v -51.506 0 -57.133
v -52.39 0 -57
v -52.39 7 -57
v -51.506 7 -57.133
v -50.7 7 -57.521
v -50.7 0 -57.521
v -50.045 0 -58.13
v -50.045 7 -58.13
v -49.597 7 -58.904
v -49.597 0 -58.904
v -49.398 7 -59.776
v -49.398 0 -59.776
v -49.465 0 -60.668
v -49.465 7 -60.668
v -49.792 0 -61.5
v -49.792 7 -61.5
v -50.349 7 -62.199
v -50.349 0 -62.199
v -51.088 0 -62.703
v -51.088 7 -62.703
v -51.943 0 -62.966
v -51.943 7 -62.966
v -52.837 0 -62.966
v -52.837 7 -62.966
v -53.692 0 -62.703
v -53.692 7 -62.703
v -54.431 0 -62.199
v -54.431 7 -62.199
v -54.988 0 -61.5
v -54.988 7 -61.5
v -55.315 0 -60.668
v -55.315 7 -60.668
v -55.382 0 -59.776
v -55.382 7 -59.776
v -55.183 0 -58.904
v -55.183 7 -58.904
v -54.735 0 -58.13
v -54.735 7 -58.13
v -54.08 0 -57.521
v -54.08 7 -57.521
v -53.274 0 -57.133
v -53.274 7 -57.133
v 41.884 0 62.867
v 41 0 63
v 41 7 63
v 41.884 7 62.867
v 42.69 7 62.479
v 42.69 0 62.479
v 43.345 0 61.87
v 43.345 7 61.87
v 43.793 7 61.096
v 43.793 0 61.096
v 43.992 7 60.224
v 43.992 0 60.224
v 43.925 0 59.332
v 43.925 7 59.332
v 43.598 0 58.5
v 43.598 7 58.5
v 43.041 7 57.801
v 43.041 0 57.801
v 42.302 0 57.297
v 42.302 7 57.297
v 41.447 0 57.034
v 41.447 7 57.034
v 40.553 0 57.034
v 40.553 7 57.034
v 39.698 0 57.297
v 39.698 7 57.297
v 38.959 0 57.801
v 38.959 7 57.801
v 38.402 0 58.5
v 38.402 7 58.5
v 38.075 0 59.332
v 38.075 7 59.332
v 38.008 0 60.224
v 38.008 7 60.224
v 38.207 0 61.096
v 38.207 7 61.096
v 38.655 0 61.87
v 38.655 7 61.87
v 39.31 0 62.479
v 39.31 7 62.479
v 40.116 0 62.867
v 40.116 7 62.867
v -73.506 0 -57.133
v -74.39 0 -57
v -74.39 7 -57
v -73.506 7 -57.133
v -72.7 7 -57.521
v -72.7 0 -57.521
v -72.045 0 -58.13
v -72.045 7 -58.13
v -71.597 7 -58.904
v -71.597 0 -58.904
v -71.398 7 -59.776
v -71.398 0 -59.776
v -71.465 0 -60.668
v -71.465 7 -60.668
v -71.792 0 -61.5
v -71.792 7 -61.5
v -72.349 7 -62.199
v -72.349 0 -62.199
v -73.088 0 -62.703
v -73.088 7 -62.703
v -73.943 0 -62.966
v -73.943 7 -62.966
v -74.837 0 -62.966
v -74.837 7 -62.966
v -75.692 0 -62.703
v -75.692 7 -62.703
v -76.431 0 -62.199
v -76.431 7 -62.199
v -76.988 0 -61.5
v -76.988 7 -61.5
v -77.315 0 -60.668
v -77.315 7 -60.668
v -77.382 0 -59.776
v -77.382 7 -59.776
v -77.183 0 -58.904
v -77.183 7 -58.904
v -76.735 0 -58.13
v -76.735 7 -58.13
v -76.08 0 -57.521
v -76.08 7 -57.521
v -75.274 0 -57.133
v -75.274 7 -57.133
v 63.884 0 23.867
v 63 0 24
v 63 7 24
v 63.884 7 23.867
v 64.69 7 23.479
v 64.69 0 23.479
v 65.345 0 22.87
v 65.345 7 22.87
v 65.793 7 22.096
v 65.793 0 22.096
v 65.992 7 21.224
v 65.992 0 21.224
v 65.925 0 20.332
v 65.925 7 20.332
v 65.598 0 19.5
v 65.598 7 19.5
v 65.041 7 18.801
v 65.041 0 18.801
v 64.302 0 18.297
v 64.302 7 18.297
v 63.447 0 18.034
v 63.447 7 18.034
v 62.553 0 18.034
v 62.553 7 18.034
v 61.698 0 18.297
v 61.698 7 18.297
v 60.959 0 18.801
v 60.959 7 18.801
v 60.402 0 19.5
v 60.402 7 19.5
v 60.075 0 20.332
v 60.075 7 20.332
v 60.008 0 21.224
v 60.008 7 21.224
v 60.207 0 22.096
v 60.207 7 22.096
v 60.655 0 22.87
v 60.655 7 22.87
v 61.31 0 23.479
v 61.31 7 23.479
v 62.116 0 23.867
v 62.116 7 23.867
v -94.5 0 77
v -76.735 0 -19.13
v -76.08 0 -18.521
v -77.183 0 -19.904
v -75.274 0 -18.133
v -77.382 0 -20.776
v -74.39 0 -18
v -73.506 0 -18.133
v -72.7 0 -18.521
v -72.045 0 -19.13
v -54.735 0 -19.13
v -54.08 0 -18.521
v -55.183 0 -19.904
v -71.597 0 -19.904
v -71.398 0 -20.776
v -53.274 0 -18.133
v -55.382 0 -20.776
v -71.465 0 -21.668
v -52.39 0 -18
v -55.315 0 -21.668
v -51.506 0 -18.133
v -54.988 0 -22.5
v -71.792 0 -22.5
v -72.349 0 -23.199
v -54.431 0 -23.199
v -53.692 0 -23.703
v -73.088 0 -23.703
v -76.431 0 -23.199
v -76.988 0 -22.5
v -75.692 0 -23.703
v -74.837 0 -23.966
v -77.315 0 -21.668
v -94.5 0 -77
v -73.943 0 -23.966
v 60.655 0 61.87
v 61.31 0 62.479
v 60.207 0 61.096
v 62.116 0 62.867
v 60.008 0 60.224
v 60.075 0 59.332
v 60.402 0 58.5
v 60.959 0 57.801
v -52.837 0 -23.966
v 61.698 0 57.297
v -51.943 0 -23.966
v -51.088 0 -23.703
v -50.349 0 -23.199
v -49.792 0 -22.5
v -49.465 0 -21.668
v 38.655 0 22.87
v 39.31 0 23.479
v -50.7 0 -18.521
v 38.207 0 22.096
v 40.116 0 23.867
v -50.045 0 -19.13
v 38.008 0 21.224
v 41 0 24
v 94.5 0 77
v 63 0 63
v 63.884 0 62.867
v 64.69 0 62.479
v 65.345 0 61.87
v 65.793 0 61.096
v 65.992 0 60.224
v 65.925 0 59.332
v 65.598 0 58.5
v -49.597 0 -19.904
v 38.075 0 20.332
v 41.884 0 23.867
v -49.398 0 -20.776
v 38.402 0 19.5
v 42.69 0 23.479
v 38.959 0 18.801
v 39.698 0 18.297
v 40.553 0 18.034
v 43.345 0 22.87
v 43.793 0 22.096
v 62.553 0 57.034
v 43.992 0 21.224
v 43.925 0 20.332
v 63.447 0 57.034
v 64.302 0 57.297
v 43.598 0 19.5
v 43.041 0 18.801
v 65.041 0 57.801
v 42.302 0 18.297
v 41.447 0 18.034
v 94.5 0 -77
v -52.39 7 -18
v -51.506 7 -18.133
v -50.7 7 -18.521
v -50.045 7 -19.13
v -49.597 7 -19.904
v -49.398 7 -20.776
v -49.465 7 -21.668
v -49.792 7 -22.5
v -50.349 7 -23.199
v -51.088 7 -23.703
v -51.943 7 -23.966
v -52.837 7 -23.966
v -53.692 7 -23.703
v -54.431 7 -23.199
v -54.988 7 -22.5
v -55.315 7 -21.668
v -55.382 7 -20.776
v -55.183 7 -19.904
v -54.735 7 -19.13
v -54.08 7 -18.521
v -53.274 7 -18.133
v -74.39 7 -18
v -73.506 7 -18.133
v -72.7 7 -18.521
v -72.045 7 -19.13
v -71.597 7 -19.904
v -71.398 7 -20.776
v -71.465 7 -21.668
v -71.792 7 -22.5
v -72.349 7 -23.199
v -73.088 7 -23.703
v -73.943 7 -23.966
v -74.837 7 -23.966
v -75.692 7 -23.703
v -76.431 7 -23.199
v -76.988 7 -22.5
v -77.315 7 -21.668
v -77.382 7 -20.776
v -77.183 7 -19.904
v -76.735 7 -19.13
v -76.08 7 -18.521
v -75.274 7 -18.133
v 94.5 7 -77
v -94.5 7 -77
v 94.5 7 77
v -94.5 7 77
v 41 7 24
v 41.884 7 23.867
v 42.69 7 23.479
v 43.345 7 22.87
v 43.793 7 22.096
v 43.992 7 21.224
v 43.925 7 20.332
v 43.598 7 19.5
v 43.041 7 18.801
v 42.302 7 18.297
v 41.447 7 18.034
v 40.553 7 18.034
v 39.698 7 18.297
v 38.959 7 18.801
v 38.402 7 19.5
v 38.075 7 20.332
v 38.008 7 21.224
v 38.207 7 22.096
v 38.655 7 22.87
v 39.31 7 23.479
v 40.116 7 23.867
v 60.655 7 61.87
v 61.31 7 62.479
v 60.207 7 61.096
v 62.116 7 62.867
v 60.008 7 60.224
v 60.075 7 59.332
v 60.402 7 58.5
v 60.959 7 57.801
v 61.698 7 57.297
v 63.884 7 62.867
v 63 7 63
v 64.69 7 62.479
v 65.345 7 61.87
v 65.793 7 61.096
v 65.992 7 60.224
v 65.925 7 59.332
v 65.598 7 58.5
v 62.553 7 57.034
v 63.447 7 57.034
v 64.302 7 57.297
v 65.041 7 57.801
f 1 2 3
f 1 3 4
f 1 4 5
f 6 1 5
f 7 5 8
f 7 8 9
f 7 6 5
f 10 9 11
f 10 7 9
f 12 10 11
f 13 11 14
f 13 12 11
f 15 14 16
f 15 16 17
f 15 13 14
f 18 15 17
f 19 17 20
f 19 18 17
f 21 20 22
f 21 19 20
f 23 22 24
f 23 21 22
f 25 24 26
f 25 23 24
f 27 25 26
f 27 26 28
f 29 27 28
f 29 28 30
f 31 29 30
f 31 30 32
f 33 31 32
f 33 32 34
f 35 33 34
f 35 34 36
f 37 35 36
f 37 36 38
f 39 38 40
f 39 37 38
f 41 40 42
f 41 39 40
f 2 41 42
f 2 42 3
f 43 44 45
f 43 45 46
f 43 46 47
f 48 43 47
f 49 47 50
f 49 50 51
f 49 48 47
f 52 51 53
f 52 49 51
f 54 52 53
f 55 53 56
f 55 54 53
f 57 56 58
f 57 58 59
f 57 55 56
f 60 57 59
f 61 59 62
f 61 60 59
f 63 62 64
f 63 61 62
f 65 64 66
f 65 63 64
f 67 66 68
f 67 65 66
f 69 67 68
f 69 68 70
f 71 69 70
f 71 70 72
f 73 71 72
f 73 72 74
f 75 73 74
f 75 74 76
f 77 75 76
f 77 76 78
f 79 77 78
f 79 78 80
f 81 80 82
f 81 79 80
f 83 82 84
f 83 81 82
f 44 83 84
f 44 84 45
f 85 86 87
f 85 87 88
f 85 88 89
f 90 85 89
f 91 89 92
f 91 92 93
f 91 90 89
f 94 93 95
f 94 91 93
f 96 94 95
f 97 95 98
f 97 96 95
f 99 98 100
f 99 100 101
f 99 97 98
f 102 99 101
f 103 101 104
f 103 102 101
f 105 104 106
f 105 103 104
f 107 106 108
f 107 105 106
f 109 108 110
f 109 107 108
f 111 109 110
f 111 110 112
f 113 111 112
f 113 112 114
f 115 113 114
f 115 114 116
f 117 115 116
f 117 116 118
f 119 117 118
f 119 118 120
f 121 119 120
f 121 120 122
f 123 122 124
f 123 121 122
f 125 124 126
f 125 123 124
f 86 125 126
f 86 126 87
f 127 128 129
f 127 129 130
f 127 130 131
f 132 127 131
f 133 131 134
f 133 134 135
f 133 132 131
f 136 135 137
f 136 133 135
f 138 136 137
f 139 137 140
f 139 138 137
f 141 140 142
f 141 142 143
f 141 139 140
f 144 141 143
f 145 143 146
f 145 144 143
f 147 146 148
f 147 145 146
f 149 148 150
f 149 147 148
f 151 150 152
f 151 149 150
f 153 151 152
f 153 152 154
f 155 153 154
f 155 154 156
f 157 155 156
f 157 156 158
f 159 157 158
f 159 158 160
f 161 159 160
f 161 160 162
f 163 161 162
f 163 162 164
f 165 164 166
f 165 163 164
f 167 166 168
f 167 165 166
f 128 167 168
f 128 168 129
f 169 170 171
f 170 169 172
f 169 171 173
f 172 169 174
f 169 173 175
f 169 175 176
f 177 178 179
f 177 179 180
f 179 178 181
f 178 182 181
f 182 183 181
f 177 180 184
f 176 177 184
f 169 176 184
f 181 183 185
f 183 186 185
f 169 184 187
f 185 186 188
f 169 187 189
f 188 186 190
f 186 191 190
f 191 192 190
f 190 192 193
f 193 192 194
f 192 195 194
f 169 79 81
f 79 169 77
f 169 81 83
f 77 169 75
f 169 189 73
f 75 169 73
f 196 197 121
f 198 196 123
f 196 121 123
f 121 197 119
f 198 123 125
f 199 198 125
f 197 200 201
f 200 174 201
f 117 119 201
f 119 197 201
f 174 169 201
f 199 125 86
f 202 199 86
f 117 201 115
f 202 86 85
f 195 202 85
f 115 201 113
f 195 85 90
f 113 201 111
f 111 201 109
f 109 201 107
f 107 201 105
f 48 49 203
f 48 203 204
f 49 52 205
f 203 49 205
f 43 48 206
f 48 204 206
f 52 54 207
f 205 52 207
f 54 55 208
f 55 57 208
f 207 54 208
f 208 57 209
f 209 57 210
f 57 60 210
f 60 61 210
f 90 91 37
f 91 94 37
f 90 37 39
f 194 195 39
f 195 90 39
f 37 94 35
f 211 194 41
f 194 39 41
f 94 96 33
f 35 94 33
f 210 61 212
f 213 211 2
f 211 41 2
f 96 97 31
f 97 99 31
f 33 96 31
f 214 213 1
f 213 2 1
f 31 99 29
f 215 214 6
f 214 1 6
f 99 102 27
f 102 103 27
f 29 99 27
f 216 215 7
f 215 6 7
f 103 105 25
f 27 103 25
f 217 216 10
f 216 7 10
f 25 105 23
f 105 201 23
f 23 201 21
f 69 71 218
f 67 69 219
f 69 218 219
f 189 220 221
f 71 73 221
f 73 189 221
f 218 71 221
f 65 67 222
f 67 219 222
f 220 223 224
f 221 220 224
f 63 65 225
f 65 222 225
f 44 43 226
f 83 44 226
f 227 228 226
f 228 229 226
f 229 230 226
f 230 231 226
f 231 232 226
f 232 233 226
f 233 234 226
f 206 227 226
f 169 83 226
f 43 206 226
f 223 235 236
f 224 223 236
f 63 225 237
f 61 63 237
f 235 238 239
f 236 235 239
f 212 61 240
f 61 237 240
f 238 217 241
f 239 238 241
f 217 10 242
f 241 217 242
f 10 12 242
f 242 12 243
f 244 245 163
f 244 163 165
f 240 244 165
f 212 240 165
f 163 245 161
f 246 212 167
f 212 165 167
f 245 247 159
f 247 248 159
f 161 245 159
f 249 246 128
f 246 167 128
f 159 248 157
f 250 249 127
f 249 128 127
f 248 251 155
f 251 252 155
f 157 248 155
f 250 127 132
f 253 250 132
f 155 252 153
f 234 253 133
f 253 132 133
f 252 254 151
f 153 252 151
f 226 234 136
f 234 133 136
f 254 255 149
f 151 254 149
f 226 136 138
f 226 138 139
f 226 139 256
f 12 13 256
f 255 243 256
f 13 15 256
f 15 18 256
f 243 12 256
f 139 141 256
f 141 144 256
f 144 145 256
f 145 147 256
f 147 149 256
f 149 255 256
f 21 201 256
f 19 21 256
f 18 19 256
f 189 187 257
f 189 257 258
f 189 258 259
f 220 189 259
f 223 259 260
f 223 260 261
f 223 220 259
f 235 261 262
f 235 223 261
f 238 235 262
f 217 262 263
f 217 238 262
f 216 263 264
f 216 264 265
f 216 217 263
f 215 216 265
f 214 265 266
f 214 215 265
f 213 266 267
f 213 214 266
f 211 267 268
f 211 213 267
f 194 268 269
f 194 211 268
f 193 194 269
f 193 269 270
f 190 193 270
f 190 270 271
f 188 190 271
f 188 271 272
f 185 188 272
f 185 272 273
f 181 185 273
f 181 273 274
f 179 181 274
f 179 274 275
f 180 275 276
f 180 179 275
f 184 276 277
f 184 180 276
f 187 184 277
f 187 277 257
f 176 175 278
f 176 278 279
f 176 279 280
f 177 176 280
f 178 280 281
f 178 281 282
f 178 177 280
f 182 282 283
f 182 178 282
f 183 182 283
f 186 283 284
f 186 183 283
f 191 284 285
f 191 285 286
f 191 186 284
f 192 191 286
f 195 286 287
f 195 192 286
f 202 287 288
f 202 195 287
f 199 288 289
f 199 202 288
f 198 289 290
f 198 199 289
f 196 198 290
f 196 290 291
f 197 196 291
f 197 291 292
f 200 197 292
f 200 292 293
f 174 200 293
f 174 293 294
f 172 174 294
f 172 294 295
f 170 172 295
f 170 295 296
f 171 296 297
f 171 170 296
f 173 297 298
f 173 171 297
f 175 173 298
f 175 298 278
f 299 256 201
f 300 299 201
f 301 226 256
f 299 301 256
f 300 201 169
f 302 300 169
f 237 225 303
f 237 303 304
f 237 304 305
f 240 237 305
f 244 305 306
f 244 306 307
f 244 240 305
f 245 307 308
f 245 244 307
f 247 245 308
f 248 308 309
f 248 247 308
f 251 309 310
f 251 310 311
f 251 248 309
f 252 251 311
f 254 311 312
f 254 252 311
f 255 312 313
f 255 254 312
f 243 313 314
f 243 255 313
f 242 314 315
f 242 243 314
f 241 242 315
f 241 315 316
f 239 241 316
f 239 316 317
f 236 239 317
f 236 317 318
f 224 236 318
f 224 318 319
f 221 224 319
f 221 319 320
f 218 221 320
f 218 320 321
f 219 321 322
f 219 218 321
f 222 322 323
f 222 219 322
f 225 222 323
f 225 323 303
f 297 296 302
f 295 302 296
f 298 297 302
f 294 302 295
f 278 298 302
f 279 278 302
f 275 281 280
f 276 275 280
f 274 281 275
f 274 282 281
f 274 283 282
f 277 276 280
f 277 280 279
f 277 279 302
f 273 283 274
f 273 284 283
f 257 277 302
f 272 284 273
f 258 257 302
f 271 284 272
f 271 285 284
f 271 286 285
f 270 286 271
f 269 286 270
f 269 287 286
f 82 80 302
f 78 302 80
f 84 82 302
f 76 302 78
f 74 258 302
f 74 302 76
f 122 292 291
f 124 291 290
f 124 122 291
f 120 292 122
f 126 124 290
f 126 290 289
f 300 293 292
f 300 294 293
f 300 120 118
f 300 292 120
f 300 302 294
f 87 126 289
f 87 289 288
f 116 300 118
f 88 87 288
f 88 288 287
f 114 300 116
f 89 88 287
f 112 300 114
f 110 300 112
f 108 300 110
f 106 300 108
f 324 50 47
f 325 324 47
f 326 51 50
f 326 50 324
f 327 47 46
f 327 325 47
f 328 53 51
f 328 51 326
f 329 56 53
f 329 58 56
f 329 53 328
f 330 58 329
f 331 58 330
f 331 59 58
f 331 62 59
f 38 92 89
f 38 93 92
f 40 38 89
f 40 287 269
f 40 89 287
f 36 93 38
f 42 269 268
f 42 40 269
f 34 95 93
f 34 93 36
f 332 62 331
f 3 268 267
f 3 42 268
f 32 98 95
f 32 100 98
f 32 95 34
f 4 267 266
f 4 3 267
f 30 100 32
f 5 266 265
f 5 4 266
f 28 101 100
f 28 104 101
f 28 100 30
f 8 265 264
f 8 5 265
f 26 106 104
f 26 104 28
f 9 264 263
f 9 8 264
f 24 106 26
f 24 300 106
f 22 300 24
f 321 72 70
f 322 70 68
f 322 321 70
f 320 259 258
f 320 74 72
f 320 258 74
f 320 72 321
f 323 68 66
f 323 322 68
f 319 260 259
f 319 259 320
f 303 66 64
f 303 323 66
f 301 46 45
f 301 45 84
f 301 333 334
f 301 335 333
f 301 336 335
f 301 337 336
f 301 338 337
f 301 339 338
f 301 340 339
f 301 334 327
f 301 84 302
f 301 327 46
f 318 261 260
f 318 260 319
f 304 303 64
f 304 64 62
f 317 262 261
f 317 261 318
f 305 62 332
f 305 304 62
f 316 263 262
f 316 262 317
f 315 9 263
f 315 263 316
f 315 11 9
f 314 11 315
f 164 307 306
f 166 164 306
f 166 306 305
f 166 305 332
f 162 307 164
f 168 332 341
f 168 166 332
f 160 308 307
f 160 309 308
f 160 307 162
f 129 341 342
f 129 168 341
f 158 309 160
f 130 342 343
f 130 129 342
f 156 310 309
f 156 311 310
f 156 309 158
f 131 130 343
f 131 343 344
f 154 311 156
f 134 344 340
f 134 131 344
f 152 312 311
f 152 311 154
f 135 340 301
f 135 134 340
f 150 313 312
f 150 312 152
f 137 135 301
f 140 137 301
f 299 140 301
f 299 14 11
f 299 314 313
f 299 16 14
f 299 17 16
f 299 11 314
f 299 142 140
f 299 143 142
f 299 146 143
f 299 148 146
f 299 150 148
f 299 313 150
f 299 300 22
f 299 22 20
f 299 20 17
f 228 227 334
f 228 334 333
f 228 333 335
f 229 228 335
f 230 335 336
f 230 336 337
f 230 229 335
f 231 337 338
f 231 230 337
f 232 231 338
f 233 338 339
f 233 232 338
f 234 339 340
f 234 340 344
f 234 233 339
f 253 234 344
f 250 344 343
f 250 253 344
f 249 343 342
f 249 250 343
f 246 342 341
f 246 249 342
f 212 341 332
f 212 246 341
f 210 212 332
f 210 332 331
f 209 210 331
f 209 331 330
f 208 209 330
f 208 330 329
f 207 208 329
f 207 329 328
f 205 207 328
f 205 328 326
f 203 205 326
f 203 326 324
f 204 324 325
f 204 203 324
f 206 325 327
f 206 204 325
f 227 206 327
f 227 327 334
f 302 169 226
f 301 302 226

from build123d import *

# Parameters (mm, degrees)
SKETCH1_R           = 3
BOSS_EXTRUDE1_DEPTH = 7


with BuildPart() as part:
    # Sketch1 → Boss-Extrude1 (new body)
    with BuildSketch(Plane(origin=(0, 0, 0), x_dir=(1, 0, 0), z_dir=(0, 1, 0))):
        Polygon((30, -77), (94.5, -77), (94.5, 77), (-85.39, 77), (-94.5, 77), (-94.5, -77), align=None)
        with Locations(Location((41, -60, 0), (0, 0, 270))):
            Circle(SKETCH1_R, mode=Mode.SUBTRACT)
        with Locations(Location((63, -60, 0), (0, 0, 270))):
            Circle(SKETCH1_R, mode=Mode.SUBTRACT)
        with Locations(Location((41, -21, 0), (0, 0, 270))):
            Circle(SKETCH1_R, mode=Mode.SUBTRACT)
        with Locations(Location((63, -21, 0), (0, 0, 270))):
            Circle(SKETCH1_R, mode=Mode.SUBTRACT)
        with Locations(Location((-74.39, 21, 0), (0, 0, 270))):
            Circle(SKETCH1_R, mode=Mode.SUBTRACT)
        with Locations(Location((-52.39, 21, 0), (0, 0, 270))):
            Circle(SKETCH1_R, mode=Mode.SUBTRACT)
        with Locations(Location((-74.39, 60, 0), (0, 0, 270))):
            Circle(SKETCH1_R, mode=Mode.SUBTRACT)
        with Locations(Location((-52.39, 60, 0), (0, 0, 270))):
            Circle(SKETCH1_R, mode=Mode.SUBTRACT)
    extrude(amount=BOSS_EXTRUDE1_DEPTH)


solid = part.part
